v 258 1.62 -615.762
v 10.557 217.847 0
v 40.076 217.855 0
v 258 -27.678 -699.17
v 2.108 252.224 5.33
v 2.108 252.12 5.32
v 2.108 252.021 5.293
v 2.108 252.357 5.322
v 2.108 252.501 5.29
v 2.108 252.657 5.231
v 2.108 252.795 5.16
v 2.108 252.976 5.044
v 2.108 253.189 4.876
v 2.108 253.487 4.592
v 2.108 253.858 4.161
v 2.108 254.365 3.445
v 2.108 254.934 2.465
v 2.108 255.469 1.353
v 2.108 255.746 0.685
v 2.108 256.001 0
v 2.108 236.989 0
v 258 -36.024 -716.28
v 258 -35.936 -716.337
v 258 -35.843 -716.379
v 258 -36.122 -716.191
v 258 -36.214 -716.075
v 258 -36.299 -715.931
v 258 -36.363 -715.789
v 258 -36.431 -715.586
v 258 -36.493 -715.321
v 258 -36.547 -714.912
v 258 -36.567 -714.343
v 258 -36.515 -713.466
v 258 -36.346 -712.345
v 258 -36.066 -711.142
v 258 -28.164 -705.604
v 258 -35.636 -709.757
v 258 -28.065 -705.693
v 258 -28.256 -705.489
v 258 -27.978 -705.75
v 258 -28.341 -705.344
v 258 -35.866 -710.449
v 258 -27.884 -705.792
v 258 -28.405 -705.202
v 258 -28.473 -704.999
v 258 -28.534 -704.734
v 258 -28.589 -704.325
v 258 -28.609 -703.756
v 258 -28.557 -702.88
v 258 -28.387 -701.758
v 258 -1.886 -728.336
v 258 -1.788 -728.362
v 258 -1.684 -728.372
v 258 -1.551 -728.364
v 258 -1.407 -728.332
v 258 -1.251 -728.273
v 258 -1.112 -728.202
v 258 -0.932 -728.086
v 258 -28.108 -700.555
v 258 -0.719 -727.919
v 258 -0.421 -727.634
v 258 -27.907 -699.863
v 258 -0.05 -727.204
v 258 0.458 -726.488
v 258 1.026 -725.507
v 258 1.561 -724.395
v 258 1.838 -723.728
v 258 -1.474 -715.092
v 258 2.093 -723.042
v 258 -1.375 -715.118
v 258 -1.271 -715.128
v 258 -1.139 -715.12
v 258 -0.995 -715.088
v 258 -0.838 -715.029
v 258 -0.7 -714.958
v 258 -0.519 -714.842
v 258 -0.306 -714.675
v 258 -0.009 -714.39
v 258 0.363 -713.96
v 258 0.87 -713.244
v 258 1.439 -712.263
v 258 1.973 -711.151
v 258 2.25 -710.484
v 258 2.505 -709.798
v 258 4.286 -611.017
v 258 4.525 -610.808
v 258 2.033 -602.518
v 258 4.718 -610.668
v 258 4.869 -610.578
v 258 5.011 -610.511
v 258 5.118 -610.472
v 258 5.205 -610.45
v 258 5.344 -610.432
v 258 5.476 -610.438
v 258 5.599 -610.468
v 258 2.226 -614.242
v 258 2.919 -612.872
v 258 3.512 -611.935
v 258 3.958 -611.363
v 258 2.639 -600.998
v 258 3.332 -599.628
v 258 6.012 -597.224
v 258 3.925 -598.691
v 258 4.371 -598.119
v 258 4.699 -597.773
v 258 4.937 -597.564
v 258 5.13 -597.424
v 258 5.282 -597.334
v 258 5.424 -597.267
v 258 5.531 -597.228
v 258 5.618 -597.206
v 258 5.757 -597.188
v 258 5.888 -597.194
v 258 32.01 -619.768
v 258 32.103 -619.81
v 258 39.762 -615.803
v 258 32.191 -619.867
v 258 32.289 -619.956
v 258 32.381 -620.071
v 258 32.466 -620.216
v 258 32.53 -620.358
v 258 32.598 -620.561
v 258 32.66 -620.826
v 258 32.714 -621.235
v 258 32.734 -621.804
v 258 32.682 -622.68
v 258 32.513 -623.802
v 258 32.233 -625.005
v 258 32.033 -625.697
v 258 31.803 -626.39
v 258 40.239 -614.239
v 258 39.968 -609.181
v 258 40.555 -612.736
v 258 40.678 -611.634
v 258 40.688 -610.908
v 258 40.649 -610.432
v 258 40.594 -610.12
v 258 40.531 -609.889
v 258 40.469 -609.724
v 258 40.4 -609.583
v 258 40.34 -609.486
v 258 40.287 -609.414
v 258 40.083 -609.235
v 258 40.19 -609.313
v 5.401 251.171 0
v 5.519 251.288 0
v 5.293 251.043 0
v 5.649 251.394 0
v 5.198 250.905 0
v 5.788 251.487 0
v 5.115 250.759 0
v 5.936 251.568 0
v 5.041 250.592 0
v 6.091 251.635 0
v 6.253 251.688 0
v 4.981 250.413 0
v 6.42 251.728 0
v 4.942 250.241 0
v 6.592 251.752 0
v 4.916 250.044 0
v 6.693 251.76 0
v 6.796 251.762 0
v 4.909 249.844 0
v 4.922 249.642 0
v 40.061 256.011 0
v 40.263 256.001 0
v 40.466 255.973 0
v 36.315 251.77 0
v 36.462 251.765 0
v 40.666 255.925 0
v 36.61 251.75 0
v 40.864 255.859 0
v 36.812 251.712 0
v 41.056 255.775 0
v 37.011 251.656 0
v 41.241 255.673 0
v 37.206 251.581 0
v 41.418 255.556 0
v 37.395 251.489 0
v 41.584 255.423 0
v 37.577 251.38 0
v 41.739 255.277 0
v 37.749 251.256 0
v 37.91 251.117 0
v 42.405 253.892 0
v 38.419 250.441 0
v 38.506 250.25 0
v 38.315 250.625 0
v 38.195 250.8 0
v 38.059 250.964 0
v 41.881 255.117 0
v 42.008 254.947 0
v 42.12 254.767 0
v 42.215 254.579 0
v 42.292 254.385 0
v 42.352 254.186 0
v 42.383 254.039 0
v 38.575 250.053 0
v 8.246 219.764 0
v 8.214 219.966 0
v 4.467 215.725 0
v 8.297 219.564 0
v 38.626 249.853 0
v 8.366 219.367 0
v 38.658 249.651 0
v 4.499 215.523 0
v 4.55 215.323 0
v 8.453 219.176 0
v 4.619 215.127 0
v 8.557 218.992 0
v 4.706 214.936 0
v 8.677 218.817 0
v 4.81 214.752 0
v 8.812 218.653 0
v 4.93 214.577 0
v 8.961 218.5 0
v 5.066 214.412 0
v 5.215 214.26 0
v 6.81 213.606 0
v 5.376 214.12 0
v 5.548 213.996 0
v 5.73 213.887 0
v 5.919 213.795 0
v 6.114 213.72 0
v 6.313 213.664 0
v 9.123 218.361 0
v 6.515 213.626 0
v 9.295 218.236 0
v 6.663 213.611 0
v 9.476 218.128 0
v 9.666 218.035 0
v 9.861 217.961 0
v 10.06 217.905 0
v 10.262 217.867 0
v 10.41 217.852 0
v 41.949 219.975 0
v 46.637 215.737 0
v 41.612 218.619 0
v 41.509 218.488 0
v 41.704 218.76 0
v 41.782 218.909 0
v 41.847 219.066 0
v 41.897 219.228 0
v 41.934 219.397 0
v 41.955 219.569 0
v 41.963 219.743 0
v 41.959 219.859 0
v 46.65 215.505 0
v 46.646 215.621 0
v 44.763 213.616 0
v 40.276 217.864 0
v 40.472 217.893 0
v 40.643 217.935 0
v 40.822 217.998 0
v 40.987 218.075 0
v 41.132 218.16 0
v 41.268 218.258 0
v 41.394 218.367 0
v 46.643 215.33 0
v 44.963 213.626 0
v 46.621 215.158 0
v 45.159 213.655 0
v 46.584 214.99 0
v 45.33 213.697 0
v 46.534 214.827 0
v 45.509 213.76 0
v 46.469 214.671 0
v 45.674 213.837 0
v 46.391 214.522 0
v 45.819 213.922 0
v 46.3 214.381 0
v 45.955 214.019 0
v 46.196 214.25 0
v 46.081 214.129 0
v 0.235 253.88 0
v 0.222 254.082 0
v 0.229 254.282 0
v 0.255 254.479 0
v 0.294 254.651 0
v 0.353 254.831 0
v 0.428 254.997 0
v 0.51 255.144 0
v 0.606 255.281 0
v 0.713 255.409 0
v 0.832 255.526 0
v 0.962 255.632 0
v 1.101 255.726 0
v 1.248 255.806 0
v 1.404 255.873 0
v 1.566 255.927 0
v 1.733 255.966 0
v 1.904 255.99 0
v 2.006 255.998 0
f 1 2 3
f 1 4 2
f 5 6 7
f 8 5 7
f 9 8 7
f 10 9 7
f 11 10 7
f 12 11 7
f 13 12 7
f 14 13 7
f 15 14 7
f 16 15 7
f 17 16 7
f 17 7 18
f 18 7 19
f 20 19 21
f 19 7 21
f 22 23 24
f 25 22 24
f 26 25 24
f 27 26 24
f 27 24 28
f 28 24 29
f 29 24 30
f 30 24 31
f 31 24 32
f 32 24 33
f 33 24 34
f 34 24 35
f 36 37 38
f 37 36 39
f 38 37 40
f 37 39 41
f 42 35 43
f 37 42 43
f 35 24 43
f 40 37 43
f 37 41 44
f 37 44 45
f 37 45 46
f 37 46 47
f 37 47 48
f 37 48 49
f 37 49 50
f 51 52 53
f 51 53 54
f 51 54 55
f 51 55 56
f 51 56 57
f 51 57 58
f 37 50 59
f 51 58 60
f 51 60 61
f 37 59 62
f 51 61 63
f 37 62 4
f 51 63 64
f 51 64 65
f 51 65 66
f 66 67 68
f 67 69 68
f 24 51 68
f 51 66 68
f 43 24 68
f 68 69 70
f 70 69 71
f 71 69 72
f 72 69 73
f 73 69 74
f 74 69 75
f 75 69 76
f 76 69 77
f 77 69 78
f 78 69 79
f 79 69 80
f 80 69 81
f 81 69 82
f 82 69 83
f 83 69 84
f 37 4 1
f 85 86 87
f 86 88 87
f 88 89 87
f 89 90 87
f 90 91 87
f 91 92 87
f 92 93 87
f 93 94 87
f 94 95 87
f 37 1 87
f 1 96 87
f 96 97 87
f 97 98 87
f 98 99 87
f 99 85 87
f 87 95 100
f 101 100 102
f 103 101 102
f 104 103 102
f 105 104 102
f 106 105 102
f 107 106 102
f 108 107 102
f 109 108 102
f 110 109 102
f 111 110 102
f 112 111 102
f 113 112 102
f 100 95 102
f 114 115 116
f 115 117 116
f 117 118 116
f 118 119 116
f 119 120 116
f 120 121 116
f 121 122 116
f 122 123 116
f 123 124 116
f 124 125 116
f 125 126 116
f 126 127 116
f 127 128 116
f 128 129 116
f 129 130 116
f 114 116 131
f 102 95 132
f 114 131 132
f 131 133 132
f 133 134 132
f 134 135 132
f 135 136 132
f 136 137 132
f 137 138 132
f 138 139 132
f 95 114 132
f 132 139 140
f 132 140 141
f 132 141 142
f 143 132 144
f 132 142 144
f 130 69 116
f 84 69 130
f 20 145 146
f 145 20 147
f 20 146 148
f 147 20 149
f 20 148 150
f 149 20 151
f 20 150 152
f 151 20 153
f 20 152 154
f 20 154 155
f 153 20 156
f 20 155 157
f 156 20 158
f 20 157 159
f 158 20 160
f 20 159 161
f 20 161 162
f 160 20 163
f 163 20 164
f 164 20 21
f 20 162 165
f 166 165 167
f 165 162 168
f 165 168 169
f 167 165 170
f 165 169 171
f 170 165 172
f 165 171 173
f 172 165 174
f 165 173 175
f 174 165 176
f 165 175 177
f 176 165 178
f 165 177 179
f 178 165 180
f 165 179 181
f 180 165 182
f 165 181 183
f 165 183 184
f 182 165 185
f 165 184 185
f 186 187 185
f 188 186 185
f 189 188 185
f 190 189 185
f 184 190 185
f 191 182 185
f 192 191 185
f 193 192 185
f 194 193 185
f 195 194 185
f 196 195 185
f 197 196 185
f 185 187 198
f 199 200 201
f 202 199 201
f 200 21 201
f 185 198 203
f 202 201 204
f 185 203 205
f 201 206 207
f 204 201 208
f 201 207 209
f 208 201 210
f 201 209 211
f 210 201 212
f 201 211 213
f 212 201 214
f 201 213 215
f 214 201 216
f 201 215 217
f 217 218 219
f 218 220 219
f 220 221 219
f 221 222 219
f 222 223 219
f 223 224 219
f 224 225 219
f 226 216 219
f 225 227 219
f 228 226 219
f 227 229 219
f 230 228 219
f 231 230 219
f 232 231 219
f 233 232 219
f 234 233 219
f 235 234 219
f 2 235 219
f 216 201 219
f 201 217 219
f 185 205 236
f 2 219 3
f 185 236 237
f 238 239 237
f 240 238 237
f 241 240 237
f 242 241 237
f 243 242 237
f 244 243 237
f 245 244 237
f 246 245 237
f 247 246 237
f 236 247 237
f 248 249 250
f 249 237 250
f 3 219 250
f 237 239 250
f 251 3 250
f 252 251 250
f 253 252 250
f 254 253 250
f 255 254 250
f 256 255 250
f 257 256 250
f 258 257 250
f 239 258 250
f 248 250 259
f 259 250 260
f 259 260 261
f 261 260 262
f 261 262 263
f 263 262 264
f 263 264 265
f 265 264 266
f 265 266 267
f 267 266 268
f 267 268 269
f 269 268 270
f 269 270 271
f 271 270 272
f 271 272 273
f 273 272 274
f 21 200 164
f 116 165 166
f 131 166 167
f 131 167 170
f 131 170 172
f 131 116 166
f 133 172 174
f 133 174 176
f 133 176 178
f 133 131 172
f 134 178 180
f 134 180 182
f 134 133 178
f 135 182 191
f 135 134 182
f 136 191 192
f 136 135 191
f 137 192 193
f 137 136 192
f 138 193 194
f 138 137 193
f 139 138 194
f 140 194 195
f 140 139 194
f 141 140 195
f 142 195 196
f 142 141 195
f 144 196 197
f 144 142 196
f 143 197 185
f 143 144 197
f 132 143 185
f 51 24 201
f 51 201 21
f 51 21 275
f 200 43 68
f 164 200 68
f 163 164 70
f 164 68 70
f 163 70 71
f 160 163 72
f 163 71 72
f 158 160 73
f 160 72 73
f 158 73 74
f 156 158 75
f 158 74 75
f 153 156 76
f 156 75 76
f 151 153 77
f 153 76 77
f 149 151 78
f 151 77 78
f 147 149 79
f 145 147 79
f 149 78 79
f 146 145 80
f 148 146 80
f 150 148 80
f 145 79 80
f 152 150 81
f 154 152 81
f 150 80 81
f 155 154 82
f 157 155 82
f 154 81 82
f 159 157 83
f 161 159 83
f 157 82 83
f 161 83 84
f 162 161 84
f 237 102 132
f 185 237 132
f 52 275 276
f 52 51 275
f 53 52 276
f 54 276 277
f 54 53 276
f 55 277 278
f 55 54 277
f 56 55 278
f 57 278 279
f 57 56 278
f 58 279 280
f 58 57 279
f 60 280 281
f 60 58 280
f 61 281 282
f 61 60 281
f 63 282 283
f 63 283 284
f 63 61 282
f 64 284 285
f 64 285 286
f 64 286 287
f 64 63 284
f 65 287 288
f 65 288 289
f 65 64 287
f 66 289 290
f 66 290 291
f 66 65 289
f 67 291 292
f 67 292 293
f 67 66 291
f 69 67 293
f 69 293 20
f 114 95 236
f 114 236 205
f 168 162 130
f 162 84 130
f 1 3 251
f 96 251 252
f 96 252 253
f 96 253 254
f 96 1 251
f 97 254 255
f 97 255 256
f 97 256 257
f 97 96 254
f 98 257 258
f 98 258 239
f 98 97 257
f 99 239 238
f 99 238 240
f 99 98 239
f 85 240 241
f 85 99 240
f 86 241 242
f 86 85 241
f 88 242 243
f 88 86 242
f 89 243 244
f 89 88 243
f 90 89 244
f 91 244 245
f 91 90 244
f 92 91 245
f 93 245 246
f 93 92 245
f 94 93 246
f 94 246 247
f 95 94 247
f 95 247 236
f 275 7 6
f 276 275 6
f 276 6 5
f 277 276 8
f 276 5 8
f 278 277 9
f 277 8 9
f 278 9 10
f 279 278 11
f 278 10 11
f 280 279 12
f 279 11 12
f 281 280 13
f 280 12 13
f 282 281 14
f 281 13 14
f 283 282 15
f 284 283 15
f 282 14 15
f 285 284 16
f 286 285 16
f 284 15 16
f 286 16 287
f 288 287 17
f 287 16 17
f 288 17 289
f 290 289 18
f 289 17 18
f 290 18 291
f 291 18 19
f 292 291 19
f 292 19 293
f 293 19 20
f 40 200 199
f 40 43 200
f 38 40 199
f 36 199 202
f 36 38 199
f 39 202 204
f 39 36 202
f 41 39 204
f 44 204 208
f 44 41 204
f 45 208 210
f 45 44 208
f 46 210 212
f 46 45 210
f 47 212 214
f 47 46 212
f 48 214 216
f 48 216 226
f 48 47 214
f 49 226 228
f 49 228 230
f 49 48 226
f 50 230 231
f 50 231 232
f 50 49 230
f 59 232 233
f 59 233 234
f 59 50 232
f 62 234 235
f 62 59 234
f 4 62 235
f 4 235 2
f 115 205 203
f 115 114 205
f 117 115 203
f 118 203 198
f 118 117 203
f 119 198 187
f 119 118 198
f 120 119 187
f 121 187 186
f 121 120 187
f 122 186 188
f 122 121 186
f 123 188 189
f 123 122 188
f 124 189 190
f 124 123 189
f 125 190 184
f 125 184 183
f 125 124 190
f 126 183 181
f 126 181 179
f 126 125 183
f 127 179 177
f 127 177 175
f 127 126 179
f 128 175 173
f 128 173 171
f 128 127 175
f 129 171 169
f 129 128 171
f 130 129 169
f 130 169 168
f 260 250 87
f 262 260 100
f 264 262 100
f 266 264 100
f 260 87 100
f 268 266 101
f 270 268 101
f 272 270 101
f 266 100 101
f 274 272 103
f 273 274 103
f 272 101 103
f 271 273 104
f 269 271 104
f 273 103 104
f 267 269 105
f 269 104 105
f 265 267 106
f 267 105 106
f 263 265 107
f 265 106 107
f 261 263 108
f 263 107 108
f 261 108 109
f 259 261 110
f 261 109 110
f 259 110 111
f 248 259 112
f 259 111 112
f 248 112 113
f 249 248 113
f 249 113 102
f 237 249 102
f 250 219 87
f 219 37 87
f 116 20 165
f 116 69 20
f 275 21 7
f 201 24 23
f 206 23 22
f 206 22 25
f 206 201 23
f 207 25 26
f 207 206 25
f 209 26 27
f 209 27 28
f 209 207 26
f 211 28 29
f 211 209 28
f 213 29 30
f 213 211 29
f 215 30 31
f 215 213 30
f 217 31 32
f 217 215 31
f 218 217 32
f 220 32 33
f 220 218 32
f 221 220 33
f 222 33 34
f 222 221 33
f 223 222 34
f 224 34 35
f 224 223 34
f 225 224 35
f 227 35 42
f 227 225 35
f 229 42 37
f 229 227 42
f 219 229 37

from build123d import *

# Parameters (mm, degrees)
BOSS_EXTRU_1_DEPTH            = 729
ENL_V_MAT_EXTRU_1_DEPTH       = 727
ESQUISSE3_W                   = 40
ESQUISSE3_H                   = 40
BOSS_EXTRU_2_DEPTH            = 814.58026
ENL_V_MAT_EXTRU_2_DEPTH       = 829.69546376
ENL_V_MAT_EXTRU_2_DEPTH_BACK  = 829.69546376
ESQUISSE4_W                   = 98.578400591
ESQUISSE4_H                   = 147.950096535
ESQUISSE4_W_2                 = 77.840885054
ESQUISSE4_H_2                 = 46.084081252
ESQUISSE7_W                   = 821.544509843
ESQUISSE7_H                   = 616.158382383
ESQUISSE7_W_2                 = 40
ESQUISSE7_H_2                 = 40
ENL_V_MAT_EXTRU_6_DEPTH       = 828.213294061
ESQUISSE8_W                   = 32
ESQUISSE8_H                   = 32
ENL_V_MAT_EXTRU_9_DEPTH       = 828.213294061
CONG_2_R                      = 2
ENL_V_MAT_EXTRU_10_DEPTH      = 815.022307134
ENL_V_MAT_EXTRU_10_DEPTH_BACK = 815.022307134
ESQUISSE9_W                   = 398.467294392
ESQUISSE9_H                   = 786.430421472


with BuildPart() as part:
    # Esquisse1 → Boss.-Extru.1 (new body)
    with BuildSketch(Plane.XY):
        Polygon((0, 0), (258, 0), (0, 256), align=None)
    extrude(amount=BOSS_EXTRU_1_DEPTH)

    # Esquisse2 → Enlèv. mat.-Extru.1 (cut)
    with BuildSketch(Plane.ZY):
        Polygon((0, 256), (729, 0), (729, 256), align=None)
    extrude(amount=-ENL_V_MAT_EXTRU_1_DEPTH, mode=Mode.SUBTRACT)

    # Esquisse3 → Boss.-Extru.2 (add)
    with BuildSketch(Plane(origin=(0, 256, 0), x_dir=(0.948516525956314, 0.10519863837129277, -0.2987467932423567), z_dir=(0.31672753768478995, -0.31427228545467534, 0.8949394378767902))):
        with Locations((20, -20)):
            Rectangle(ESQUISSE3_W, ESQUISSE3_H)
    extrude(amount=BOSS_EXTRU_2_DEPTH)

    # Esquisse4 → Enlèv. mat.-Extru.2 (cut, two sides: drawn at the far end of the back side and taken through both)
    with BuildSketch(Plane(origin=(0, 0, 0), x_dir=(-1, 0, 0), z_dir=(0, -1, 0)).offset(-ENL_V_MAT_EXTRU_2_DEPTH_BACK)):
        with Locations((-307.289200295, -655.024951733)):
            Rectangle(ESQUISSE4_W, ESQUISSE4_H)
        with Locations((-38.920442527, 23.042040626)):
            Rectangle(ESQUISSE4_W_2, ESQUISSE4_H_2)
    extrude(amount=ENL_V_MAT_EXTRU_2_DEPTH + ENL_V_MAT_EXTRU_2_DEPTH_BACK, mode=Mode.SUBTRACT)

    # Esquisse7 → Enlèv. mat.-Extru.6 (cut, through all)
    with BuildSketch(Plane(origin=(0, 256, 0), x_dir=(0.948516525956314, 0.10519863837129277, -0.2987467932423567), z_dir=(0.31672753768478995, -0.31427228545467534, 0.8949394378767902))):
        with Locations((22.907114777, -53.97111912)):
            Rectangle(ESQUISSE7_W, ESQUISSE7_H)
        with Locations((20, -20)):
            Rectangle(ESQUISSE7_W_2, ESQUISSE7_H_2, mode=Mode.SUBTRACT)
    extrude(amount=ENL_V_MAT_EXTRU_6_DEPTH, mode=Mode.SUBTRACT)

    # Esquisse8 → Enlèv. mat.-Extru.9 (cut, through all)
    with BuildSketch(Plane(origin=(0, 256, 0), x_dir=(0.948516525956314, 0.10519863837129277, -0.2987467932423567), z_dir=(0.31672753768478995, -0.31427228545467534, 0.8949394378767902))):
        with Locations((20, -20)):
            Rectangle(ESQUISSE8_W, ESQUISSE8_H)
    extrude(amount=ENL_V_MAT_EXTRU_9_DEPTH, mode=Mode.SUBTRACT)

    # Congé2
    cong_2_edges = [part.edges().sort_by_distance(p)[0] for p in [
        (131.343588352, 126.087109834, 357.878000354),
        (133.224361668, 94.037568496, 352.563722265),
        (150.092295167, 110.783988508, 304.90200319),
        (148.211521852, 142.833529846, 310.21628128),
        (129, 128, 364.5),
        (150.084916875, 148.933025015, 304.922851157),
        (152.435883519, 108.871098342, 298.280003544),
        (131.350966645, 87.938073327, 357.857152388),
    ]]
    fillet(cong_2_edges, radius=CONG_2_R)

    # Symétrie4: part across plane


with BuildPart() as part_1:
    add(part.part)
    add(part.part.mirror(Plane.XY))

    # Esquisse9 → Enlèv. mat.-Extru.10 (cut, two sides: drawn at the far end of the back side and taken through both)
    with BuildSketch(Plane(origin=(0, 0, 0), x_dir=(1, 0, 0), z_dir=(0, 1, 0)).offset(-ENL_V_MAT_EXTRU_10_DEPTH_BACK)):
        with Locations((201.342138883, -393.215210736)):
            Rectangle(ESQUISSE9_W, ESQUISSE9_H)
    extrude(amount=ENL_V_MAT_EXTRU_10_DEPTH + ENL_V_MAT_EXTRU_10_DEPTH_BACK, mode=Mode.SUBTRACT)


solid = part_1.part
